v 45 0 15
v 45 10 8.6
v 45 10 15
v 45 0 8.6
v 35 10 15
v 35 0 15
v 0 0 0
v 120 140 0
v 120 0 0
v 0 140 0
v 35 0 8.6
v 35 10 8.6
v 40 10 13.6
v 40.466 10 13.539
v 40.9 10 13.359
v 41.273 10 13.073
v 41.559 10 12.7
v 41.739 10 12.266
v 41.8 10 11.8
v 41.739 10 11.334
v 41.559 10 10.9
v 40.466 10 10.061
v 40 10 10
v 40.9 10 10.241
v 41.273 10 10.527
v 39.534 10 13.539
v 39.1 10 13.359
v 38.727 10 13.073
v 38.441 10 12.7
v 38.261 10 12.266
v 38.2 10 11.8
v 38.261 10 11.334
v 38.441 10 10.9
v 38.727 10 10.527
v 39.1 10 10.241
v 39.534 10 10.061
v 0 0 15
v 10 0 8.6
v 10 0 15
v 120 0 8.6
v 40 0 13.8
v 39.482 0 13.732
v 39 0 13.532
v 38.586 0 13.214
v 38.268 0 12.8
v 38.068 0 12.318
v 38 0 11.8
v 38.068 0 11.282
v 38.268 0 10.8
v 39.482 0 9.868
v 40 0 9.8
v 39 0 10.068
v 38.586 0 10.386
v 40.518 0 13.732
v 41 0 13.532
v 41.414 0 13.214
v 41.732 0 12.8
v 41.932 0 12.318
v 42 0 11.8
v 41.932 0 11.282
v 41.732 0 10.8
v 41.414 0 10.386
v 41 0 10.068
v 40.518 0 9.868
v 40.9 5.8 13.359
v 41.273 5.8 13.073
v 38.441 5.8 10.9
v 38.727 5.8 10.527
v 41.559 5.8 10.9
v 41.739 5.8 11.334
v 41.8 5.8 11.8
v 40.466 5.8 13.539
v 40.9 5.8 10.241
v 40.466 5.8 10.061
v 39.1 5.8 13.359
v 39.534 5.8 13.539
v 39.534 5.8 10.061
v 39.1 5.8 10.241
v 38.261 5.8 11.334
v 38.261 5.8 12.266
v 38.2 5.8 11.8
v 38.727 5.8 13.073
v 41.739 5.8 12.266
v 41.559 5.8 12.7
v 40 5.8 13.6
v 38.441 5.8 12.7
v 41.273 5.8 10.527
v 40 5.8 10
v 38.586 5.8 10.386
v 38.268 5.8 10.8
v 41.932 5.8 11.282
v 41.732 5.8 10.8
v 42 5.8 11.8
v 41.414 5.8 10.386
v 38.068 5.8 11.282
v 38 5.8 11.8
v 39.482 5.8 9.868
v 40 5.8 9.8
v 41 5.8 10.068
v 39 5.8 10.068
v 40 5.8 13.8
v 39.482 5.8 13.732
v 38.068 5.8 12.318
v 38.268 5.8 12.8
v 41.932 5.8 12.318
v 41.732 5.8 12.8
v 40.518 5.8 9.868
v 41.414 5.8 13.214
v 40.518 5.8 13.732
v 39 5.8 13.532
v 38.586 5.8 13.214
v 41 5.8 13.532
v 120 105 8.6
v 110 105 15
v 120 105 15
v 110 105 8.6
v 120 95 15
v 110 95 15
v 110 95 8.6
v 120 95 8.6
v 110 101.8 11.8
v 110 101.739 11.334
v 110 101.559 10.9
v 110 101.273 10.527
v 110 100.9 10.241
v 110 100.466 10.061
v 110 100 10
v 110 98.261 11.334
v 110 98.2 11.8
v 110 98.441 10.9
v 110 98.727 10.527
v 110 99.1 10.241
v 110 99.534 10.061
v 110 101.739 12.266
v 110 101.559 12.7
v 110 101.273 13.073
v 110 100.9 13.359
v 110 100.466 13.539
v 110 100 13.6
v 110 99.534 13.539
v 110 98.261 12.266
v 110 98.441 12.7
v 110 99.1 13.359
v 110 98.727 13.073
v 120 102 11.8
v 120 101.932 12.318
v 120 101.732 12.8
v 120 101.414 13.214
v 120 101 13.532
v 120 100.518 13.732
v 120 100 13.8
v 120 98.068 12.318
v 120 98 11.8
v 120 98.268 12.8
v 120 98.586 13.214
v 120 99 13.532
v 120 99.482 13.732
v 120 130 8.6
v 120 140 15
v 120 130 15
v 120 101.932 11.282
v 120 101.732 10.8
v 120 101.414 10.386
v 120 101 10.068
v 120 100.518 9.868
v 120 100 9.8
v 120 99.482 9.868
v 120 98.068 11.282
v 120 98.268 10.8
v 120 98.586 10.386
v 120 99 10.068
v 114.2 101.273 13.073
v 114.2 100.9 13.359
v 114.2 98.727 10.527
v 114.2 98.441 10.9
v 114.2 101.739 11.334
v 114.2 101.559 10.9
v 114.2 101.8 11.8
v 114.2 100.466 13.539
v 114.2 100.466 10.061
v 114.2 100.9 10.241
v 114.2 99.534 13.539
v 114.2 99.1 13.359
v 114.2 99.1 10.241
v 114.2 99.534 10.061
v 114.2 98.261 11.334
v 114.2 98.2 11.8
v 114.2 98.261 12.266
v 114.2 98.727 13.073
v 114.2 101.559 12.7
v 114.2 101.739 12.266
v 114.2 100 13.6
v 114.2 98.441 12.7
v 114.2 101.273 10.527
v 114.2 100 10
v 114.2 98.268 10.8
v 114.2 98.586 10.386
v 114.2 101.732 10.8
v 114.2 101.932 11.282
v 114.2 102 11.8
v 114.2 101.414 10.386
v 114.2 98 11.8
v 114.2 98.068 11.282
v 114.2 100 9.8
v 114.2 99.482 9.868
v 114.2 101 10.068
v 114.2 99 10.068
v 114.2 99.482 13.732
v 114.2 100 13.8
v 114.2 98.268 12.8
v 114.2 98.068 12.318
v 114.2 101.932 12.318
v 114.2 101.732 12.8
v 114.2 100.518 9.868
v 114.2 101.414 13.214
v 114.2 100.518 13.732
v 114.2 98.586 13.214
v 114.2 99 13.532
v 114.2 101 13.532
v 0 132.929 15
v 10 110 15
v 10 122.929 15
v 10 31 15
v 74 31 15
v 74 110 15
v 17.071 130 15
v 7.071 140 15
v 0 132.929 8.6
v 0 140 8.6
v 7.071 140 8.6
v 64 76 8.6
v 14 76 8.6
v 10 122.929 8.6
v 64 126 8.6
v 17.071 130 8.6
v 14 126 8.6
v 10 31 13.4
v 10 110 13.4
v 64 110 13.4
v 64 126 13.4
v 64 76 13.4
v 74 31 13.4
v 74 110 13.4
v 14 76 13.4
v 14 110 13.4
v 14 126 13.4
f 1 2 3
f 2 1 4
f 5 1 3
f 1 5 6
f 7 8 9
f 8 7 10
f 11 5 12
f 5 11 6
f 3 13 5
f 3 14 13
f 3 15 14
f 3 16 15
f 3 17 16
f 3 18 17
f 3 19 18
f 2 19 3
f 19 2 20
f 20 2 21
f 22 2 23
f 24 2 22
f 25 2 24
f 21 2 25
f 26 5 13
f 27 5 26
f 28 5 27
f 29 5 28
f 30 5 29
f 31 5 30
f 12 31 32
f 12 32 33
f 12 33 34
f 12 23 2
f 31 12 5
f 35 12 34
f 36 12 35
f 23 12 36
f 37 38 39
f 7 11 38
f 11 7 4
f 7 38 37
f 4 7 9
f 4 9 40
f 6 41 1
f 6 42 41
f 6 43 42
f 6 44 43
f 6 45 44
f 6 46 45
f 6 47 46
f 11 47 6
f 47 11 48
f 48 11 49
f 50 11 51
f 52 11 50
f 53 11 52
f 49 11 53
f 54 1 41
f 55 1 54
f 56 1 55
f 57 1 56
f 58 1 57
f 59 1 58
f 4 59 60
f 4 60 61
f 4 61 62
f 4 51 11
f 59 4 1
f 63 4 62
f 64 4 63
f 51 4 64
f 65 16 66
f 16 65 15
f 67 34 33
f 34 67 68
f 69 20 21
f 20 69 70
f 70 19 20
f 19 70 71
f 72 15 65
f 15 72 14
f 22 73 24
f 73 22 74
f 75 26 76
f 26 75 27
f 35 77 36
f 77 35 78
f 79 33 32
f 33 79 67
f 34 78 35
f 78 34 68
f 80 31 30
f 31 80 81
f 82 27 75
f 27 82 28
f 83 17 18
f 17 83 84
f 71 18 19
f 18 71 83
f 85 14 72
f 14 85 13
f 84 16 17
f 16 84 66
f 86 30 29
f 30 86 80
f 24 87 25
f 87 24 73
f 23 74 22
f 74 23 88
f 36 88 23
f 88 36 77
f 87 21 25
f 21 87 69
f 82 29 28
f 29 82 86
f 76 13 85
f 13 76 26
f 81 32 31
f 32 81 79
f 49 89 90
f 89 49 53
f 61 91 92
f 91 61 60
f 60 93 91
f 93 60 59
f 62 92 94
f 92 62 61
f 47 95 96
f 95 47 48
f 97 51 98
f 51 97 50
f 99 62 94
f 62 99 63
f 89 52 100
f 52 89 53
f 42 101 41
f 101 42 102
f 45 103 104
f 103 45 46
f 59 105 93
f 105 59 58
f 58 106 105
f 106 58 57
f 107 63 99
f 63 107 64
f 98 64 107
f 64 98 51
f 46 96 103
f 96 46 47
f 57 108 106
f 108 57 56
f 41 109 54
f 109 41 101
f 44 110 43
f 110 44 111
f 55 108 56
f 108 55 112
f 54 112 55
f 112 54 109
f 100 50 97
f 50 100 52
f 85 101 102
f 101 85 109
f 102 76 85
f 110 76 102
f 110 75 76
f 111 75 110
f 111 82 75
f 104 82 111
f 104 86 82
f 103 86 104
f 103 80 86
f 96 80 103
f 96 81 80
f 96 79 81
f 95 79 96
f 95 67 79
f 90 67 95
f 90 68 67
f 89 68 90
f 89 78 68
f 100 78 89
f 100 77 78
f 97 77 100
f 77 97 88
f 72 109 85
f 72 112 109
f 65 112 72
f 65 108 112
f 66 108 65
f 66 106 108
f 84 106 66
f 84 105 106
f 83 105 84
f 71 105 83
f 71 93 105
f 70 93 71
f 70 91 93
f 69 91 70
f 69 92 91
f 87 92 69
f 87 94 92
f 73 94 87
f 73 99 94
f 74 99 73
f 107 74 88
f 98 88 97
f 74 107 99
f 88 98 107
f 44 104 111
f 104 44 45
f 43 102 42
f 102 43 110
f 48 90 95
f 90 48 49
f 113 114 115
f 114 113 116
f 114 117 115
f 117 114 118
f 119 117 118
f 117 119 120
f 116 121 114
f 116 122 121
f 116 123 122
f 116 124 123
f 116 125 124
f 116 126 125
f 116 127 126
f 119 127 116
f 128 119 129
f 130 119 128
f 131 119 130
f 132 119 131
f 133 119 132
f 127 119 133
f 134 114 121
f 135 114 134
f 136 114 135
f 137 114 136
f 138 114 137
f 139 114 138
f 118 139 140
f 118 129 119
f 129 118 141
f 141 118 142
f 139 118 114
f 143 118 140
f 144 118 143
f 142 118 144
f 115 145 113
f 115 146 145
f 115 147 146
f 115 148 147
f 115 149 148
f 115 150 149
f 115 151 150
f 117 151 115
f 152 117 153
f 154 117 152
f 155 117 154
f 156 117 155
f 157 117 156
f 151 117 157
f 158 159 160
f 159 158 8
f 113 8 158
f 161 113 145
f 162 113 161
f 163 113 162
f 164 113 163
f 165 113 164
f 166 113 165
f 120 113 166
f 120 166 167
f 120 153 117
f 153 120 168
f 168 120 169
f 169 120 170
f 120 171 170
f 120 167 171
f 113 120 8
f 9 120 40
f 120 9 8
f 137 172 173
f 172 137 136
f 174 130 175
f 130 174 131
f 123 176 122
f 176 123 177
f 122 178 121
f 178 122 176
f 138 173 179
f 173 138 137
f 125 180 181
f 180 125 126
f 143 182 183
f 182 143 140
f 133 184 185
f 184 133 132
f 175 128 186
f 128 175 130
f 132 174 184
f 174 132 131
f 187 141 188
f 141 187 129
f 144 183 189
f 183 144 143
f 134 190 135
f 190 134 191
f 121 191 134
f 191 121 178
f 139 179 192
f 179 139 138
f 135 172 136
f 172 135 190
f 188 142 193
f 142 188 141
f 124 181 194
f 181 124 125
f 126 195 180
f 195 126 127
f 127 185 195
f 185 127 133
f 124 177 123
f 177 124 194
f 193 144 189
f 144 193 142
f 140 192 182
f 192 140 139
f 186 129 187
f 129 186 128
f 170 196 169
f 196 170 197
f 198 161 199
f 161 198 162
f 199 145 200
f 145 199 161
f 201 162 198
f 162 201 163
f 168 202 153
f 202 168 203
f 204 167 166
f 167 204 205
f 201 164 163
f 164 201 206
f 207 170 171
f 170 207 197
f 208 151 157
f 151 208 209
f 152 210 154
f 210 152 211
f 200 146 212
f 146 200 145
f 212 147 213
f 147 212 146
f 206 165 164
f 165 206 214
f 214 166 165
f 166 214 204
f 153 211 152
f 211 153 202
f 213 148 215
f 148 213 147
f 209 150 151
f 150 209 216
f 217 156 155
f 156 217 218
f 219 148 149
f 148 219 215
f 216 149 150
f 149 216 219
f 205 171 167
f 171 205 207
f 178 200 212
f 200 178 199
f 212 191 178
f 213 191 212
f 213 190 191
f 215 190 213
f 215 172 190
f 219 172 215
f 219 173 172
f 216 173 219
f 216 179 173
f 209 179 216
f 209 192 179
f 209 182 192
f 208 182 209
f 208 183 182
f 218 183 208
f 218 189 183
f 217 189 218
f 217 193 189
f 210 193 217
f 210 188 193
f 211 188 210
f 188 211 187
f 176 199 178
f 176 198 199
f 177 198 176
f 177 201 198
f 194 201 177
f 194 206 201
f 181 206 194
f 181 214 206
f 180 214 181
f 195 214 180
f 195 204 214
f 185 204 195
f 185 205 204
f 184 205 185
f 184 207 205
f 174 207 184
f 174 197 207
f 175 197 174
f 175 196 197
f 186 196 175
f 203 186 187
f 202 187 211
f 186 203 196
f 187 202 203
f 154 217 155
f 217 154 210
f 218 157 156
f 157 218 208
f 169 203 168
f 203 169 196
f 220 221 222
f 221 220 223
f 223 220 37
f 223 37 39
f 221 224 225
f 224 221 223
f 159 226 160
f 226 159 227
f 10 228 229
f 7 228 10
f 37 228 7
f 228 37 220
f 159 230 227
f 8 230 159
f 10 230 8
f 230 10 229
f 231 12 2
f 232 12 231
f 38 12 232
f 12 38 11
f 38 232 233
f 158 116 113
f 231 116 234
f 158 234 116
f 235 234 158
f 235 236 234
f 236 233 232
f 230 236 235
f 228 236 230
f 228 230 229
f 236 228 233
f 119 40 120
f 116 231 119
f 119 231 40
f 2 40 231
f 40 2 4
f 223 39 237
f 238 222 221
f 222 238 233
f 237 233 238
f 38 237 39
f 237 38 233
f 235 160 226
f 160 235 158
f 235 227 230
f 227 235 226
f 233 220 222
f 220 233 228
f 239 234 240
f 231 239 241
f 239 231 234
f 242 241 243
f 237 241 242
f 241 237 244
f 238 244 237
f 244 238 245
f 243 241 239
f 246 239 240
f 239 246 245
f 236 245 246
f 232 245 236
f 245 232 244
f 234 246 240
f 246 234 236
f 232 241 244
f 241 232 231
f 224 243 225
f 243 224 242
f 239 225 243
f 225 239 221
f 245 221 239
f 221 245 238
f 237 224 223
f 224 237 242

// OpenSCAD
// file: parameters.scad
// Screw threads.
// Note that the depth is increased by 0.1 mm as compared
// to the data sheet.
// The diameter corresponds to the d3 from the data sheet,
// and the depth correponds to the L.

// M2
g_M2_thread_diameter = 3.2;
g_M2_thread_depth    = 4.1;

// M3
g_M3_thread_diameter = 4.0;
g_M3_thread_depth    = 5.8;

// Through holes.
// See for instance https://de.wikipedia.org/wiki/Durchgangsbohrung
g_M2_through_hole_diameter = 2.4;
g_M3_through_hole_diameter = 3.4;
g_M3_through_hole_diameter_large = 3.6;
// main file
// PCB mount

// Dimensions of the wheel speed sensor SMD-PCB
// according to the drawing: 64 mm x 79 mm
// (I double checked this via a measurement)
// Measured thickness: 1.65 mm (1.6 mm according to ordering)
//
// Stencil dimensions: 80 mm x 100 mm
// (measured, and likely given as custom size
// during ordering -- I forgot)
// Measured thickness: 0.15 mm

// space left: 16 / 2 = 8
// space top: 21 / 2 = 10.5

include <parameters.scad>

function get_fn(detailed) = detailed ? 90 : 24;
g_detailed = false;
g_fn = get_fn(g_detailed);


height_mount = 15.0;
length_mount = 120.0;
width_mount = 140.0;
// Thickness of the wall where the PCB is pushed against
wall_thickness_mount = 3.0;
// Space for the stencil (at the top and left)
stencil_space = 7.0;
// Gap
gap_mount = 4.0;
height_pcb = 1.6;
// Height of the center (axis) of the holes
// for the horizontal screws that fixate
// the PCB
height_holes = height_mount - 2*height_pcb;

module pcb() {
    cube([64, 79, height_pcb]);
}

module pcb_mount() {
    difference() {
        cube([length_mount, width_mount, height_mount]);
        translate([stencil_space+wall_thickness_mount,0,height_mount-4*height_pcb])
            cube([length_mount-stencil_space-wall_thickness_mount,
                  width_mount-stencil_space-wall_thickness_mount,4*height_pcb]);
        translate([0,width_mount,height_mount-4*height_pcb])
            rotate([0,0,-45])
                translate([-50,-5,0])
                    cube([length_mount,10,4*height_pcb]);

    }
    translate([stencil_space+wall_thickness_mount+gap_mount,
               width_mount-50-(stencil_space+wall_thickness_mount+gap_mount), 0])
        cube([50,50,height_mount-height_pcb]);
}

module screw_mount() {
    screw_mount_thickness = 10.0;
    screw_mount_height = height_mount;
    difference() {
        translate([0,0,0.5*screw_mount_height])
            cube([10,screw_mount_thickness,screw_mount_height], center=true);
        // Through hole
        translate([0,0,height_holes])
            rotate([270,0,0])
                translate([0,0,-0.5*screw_mount_thickness])
                    cylinder(h = screw_mount_thickness, d = g_M3_through_hole_diameter_large, $fn = g_fn);
        // Hole for mounting the threads
        translate([0,0,height_holes])
            rotate([270,0,0])
                translate([0,0,-0.5*screw_mount_thickness])
                    cylinder(h = g_M3_thread_depth, d = g_M3_thread_diameter, $fn = g_fn);
    }
}

translate([40,5,0])
    screw_mount();
translate([length_mount-5,width_mount-40,0])
    rotate([0,0,90])
        screw_mount();

pcb_mount();
translate([10,120-79-10,height_mount-height_pcb])
    color([0.0, 0.5, 0.0])
        pcb();
